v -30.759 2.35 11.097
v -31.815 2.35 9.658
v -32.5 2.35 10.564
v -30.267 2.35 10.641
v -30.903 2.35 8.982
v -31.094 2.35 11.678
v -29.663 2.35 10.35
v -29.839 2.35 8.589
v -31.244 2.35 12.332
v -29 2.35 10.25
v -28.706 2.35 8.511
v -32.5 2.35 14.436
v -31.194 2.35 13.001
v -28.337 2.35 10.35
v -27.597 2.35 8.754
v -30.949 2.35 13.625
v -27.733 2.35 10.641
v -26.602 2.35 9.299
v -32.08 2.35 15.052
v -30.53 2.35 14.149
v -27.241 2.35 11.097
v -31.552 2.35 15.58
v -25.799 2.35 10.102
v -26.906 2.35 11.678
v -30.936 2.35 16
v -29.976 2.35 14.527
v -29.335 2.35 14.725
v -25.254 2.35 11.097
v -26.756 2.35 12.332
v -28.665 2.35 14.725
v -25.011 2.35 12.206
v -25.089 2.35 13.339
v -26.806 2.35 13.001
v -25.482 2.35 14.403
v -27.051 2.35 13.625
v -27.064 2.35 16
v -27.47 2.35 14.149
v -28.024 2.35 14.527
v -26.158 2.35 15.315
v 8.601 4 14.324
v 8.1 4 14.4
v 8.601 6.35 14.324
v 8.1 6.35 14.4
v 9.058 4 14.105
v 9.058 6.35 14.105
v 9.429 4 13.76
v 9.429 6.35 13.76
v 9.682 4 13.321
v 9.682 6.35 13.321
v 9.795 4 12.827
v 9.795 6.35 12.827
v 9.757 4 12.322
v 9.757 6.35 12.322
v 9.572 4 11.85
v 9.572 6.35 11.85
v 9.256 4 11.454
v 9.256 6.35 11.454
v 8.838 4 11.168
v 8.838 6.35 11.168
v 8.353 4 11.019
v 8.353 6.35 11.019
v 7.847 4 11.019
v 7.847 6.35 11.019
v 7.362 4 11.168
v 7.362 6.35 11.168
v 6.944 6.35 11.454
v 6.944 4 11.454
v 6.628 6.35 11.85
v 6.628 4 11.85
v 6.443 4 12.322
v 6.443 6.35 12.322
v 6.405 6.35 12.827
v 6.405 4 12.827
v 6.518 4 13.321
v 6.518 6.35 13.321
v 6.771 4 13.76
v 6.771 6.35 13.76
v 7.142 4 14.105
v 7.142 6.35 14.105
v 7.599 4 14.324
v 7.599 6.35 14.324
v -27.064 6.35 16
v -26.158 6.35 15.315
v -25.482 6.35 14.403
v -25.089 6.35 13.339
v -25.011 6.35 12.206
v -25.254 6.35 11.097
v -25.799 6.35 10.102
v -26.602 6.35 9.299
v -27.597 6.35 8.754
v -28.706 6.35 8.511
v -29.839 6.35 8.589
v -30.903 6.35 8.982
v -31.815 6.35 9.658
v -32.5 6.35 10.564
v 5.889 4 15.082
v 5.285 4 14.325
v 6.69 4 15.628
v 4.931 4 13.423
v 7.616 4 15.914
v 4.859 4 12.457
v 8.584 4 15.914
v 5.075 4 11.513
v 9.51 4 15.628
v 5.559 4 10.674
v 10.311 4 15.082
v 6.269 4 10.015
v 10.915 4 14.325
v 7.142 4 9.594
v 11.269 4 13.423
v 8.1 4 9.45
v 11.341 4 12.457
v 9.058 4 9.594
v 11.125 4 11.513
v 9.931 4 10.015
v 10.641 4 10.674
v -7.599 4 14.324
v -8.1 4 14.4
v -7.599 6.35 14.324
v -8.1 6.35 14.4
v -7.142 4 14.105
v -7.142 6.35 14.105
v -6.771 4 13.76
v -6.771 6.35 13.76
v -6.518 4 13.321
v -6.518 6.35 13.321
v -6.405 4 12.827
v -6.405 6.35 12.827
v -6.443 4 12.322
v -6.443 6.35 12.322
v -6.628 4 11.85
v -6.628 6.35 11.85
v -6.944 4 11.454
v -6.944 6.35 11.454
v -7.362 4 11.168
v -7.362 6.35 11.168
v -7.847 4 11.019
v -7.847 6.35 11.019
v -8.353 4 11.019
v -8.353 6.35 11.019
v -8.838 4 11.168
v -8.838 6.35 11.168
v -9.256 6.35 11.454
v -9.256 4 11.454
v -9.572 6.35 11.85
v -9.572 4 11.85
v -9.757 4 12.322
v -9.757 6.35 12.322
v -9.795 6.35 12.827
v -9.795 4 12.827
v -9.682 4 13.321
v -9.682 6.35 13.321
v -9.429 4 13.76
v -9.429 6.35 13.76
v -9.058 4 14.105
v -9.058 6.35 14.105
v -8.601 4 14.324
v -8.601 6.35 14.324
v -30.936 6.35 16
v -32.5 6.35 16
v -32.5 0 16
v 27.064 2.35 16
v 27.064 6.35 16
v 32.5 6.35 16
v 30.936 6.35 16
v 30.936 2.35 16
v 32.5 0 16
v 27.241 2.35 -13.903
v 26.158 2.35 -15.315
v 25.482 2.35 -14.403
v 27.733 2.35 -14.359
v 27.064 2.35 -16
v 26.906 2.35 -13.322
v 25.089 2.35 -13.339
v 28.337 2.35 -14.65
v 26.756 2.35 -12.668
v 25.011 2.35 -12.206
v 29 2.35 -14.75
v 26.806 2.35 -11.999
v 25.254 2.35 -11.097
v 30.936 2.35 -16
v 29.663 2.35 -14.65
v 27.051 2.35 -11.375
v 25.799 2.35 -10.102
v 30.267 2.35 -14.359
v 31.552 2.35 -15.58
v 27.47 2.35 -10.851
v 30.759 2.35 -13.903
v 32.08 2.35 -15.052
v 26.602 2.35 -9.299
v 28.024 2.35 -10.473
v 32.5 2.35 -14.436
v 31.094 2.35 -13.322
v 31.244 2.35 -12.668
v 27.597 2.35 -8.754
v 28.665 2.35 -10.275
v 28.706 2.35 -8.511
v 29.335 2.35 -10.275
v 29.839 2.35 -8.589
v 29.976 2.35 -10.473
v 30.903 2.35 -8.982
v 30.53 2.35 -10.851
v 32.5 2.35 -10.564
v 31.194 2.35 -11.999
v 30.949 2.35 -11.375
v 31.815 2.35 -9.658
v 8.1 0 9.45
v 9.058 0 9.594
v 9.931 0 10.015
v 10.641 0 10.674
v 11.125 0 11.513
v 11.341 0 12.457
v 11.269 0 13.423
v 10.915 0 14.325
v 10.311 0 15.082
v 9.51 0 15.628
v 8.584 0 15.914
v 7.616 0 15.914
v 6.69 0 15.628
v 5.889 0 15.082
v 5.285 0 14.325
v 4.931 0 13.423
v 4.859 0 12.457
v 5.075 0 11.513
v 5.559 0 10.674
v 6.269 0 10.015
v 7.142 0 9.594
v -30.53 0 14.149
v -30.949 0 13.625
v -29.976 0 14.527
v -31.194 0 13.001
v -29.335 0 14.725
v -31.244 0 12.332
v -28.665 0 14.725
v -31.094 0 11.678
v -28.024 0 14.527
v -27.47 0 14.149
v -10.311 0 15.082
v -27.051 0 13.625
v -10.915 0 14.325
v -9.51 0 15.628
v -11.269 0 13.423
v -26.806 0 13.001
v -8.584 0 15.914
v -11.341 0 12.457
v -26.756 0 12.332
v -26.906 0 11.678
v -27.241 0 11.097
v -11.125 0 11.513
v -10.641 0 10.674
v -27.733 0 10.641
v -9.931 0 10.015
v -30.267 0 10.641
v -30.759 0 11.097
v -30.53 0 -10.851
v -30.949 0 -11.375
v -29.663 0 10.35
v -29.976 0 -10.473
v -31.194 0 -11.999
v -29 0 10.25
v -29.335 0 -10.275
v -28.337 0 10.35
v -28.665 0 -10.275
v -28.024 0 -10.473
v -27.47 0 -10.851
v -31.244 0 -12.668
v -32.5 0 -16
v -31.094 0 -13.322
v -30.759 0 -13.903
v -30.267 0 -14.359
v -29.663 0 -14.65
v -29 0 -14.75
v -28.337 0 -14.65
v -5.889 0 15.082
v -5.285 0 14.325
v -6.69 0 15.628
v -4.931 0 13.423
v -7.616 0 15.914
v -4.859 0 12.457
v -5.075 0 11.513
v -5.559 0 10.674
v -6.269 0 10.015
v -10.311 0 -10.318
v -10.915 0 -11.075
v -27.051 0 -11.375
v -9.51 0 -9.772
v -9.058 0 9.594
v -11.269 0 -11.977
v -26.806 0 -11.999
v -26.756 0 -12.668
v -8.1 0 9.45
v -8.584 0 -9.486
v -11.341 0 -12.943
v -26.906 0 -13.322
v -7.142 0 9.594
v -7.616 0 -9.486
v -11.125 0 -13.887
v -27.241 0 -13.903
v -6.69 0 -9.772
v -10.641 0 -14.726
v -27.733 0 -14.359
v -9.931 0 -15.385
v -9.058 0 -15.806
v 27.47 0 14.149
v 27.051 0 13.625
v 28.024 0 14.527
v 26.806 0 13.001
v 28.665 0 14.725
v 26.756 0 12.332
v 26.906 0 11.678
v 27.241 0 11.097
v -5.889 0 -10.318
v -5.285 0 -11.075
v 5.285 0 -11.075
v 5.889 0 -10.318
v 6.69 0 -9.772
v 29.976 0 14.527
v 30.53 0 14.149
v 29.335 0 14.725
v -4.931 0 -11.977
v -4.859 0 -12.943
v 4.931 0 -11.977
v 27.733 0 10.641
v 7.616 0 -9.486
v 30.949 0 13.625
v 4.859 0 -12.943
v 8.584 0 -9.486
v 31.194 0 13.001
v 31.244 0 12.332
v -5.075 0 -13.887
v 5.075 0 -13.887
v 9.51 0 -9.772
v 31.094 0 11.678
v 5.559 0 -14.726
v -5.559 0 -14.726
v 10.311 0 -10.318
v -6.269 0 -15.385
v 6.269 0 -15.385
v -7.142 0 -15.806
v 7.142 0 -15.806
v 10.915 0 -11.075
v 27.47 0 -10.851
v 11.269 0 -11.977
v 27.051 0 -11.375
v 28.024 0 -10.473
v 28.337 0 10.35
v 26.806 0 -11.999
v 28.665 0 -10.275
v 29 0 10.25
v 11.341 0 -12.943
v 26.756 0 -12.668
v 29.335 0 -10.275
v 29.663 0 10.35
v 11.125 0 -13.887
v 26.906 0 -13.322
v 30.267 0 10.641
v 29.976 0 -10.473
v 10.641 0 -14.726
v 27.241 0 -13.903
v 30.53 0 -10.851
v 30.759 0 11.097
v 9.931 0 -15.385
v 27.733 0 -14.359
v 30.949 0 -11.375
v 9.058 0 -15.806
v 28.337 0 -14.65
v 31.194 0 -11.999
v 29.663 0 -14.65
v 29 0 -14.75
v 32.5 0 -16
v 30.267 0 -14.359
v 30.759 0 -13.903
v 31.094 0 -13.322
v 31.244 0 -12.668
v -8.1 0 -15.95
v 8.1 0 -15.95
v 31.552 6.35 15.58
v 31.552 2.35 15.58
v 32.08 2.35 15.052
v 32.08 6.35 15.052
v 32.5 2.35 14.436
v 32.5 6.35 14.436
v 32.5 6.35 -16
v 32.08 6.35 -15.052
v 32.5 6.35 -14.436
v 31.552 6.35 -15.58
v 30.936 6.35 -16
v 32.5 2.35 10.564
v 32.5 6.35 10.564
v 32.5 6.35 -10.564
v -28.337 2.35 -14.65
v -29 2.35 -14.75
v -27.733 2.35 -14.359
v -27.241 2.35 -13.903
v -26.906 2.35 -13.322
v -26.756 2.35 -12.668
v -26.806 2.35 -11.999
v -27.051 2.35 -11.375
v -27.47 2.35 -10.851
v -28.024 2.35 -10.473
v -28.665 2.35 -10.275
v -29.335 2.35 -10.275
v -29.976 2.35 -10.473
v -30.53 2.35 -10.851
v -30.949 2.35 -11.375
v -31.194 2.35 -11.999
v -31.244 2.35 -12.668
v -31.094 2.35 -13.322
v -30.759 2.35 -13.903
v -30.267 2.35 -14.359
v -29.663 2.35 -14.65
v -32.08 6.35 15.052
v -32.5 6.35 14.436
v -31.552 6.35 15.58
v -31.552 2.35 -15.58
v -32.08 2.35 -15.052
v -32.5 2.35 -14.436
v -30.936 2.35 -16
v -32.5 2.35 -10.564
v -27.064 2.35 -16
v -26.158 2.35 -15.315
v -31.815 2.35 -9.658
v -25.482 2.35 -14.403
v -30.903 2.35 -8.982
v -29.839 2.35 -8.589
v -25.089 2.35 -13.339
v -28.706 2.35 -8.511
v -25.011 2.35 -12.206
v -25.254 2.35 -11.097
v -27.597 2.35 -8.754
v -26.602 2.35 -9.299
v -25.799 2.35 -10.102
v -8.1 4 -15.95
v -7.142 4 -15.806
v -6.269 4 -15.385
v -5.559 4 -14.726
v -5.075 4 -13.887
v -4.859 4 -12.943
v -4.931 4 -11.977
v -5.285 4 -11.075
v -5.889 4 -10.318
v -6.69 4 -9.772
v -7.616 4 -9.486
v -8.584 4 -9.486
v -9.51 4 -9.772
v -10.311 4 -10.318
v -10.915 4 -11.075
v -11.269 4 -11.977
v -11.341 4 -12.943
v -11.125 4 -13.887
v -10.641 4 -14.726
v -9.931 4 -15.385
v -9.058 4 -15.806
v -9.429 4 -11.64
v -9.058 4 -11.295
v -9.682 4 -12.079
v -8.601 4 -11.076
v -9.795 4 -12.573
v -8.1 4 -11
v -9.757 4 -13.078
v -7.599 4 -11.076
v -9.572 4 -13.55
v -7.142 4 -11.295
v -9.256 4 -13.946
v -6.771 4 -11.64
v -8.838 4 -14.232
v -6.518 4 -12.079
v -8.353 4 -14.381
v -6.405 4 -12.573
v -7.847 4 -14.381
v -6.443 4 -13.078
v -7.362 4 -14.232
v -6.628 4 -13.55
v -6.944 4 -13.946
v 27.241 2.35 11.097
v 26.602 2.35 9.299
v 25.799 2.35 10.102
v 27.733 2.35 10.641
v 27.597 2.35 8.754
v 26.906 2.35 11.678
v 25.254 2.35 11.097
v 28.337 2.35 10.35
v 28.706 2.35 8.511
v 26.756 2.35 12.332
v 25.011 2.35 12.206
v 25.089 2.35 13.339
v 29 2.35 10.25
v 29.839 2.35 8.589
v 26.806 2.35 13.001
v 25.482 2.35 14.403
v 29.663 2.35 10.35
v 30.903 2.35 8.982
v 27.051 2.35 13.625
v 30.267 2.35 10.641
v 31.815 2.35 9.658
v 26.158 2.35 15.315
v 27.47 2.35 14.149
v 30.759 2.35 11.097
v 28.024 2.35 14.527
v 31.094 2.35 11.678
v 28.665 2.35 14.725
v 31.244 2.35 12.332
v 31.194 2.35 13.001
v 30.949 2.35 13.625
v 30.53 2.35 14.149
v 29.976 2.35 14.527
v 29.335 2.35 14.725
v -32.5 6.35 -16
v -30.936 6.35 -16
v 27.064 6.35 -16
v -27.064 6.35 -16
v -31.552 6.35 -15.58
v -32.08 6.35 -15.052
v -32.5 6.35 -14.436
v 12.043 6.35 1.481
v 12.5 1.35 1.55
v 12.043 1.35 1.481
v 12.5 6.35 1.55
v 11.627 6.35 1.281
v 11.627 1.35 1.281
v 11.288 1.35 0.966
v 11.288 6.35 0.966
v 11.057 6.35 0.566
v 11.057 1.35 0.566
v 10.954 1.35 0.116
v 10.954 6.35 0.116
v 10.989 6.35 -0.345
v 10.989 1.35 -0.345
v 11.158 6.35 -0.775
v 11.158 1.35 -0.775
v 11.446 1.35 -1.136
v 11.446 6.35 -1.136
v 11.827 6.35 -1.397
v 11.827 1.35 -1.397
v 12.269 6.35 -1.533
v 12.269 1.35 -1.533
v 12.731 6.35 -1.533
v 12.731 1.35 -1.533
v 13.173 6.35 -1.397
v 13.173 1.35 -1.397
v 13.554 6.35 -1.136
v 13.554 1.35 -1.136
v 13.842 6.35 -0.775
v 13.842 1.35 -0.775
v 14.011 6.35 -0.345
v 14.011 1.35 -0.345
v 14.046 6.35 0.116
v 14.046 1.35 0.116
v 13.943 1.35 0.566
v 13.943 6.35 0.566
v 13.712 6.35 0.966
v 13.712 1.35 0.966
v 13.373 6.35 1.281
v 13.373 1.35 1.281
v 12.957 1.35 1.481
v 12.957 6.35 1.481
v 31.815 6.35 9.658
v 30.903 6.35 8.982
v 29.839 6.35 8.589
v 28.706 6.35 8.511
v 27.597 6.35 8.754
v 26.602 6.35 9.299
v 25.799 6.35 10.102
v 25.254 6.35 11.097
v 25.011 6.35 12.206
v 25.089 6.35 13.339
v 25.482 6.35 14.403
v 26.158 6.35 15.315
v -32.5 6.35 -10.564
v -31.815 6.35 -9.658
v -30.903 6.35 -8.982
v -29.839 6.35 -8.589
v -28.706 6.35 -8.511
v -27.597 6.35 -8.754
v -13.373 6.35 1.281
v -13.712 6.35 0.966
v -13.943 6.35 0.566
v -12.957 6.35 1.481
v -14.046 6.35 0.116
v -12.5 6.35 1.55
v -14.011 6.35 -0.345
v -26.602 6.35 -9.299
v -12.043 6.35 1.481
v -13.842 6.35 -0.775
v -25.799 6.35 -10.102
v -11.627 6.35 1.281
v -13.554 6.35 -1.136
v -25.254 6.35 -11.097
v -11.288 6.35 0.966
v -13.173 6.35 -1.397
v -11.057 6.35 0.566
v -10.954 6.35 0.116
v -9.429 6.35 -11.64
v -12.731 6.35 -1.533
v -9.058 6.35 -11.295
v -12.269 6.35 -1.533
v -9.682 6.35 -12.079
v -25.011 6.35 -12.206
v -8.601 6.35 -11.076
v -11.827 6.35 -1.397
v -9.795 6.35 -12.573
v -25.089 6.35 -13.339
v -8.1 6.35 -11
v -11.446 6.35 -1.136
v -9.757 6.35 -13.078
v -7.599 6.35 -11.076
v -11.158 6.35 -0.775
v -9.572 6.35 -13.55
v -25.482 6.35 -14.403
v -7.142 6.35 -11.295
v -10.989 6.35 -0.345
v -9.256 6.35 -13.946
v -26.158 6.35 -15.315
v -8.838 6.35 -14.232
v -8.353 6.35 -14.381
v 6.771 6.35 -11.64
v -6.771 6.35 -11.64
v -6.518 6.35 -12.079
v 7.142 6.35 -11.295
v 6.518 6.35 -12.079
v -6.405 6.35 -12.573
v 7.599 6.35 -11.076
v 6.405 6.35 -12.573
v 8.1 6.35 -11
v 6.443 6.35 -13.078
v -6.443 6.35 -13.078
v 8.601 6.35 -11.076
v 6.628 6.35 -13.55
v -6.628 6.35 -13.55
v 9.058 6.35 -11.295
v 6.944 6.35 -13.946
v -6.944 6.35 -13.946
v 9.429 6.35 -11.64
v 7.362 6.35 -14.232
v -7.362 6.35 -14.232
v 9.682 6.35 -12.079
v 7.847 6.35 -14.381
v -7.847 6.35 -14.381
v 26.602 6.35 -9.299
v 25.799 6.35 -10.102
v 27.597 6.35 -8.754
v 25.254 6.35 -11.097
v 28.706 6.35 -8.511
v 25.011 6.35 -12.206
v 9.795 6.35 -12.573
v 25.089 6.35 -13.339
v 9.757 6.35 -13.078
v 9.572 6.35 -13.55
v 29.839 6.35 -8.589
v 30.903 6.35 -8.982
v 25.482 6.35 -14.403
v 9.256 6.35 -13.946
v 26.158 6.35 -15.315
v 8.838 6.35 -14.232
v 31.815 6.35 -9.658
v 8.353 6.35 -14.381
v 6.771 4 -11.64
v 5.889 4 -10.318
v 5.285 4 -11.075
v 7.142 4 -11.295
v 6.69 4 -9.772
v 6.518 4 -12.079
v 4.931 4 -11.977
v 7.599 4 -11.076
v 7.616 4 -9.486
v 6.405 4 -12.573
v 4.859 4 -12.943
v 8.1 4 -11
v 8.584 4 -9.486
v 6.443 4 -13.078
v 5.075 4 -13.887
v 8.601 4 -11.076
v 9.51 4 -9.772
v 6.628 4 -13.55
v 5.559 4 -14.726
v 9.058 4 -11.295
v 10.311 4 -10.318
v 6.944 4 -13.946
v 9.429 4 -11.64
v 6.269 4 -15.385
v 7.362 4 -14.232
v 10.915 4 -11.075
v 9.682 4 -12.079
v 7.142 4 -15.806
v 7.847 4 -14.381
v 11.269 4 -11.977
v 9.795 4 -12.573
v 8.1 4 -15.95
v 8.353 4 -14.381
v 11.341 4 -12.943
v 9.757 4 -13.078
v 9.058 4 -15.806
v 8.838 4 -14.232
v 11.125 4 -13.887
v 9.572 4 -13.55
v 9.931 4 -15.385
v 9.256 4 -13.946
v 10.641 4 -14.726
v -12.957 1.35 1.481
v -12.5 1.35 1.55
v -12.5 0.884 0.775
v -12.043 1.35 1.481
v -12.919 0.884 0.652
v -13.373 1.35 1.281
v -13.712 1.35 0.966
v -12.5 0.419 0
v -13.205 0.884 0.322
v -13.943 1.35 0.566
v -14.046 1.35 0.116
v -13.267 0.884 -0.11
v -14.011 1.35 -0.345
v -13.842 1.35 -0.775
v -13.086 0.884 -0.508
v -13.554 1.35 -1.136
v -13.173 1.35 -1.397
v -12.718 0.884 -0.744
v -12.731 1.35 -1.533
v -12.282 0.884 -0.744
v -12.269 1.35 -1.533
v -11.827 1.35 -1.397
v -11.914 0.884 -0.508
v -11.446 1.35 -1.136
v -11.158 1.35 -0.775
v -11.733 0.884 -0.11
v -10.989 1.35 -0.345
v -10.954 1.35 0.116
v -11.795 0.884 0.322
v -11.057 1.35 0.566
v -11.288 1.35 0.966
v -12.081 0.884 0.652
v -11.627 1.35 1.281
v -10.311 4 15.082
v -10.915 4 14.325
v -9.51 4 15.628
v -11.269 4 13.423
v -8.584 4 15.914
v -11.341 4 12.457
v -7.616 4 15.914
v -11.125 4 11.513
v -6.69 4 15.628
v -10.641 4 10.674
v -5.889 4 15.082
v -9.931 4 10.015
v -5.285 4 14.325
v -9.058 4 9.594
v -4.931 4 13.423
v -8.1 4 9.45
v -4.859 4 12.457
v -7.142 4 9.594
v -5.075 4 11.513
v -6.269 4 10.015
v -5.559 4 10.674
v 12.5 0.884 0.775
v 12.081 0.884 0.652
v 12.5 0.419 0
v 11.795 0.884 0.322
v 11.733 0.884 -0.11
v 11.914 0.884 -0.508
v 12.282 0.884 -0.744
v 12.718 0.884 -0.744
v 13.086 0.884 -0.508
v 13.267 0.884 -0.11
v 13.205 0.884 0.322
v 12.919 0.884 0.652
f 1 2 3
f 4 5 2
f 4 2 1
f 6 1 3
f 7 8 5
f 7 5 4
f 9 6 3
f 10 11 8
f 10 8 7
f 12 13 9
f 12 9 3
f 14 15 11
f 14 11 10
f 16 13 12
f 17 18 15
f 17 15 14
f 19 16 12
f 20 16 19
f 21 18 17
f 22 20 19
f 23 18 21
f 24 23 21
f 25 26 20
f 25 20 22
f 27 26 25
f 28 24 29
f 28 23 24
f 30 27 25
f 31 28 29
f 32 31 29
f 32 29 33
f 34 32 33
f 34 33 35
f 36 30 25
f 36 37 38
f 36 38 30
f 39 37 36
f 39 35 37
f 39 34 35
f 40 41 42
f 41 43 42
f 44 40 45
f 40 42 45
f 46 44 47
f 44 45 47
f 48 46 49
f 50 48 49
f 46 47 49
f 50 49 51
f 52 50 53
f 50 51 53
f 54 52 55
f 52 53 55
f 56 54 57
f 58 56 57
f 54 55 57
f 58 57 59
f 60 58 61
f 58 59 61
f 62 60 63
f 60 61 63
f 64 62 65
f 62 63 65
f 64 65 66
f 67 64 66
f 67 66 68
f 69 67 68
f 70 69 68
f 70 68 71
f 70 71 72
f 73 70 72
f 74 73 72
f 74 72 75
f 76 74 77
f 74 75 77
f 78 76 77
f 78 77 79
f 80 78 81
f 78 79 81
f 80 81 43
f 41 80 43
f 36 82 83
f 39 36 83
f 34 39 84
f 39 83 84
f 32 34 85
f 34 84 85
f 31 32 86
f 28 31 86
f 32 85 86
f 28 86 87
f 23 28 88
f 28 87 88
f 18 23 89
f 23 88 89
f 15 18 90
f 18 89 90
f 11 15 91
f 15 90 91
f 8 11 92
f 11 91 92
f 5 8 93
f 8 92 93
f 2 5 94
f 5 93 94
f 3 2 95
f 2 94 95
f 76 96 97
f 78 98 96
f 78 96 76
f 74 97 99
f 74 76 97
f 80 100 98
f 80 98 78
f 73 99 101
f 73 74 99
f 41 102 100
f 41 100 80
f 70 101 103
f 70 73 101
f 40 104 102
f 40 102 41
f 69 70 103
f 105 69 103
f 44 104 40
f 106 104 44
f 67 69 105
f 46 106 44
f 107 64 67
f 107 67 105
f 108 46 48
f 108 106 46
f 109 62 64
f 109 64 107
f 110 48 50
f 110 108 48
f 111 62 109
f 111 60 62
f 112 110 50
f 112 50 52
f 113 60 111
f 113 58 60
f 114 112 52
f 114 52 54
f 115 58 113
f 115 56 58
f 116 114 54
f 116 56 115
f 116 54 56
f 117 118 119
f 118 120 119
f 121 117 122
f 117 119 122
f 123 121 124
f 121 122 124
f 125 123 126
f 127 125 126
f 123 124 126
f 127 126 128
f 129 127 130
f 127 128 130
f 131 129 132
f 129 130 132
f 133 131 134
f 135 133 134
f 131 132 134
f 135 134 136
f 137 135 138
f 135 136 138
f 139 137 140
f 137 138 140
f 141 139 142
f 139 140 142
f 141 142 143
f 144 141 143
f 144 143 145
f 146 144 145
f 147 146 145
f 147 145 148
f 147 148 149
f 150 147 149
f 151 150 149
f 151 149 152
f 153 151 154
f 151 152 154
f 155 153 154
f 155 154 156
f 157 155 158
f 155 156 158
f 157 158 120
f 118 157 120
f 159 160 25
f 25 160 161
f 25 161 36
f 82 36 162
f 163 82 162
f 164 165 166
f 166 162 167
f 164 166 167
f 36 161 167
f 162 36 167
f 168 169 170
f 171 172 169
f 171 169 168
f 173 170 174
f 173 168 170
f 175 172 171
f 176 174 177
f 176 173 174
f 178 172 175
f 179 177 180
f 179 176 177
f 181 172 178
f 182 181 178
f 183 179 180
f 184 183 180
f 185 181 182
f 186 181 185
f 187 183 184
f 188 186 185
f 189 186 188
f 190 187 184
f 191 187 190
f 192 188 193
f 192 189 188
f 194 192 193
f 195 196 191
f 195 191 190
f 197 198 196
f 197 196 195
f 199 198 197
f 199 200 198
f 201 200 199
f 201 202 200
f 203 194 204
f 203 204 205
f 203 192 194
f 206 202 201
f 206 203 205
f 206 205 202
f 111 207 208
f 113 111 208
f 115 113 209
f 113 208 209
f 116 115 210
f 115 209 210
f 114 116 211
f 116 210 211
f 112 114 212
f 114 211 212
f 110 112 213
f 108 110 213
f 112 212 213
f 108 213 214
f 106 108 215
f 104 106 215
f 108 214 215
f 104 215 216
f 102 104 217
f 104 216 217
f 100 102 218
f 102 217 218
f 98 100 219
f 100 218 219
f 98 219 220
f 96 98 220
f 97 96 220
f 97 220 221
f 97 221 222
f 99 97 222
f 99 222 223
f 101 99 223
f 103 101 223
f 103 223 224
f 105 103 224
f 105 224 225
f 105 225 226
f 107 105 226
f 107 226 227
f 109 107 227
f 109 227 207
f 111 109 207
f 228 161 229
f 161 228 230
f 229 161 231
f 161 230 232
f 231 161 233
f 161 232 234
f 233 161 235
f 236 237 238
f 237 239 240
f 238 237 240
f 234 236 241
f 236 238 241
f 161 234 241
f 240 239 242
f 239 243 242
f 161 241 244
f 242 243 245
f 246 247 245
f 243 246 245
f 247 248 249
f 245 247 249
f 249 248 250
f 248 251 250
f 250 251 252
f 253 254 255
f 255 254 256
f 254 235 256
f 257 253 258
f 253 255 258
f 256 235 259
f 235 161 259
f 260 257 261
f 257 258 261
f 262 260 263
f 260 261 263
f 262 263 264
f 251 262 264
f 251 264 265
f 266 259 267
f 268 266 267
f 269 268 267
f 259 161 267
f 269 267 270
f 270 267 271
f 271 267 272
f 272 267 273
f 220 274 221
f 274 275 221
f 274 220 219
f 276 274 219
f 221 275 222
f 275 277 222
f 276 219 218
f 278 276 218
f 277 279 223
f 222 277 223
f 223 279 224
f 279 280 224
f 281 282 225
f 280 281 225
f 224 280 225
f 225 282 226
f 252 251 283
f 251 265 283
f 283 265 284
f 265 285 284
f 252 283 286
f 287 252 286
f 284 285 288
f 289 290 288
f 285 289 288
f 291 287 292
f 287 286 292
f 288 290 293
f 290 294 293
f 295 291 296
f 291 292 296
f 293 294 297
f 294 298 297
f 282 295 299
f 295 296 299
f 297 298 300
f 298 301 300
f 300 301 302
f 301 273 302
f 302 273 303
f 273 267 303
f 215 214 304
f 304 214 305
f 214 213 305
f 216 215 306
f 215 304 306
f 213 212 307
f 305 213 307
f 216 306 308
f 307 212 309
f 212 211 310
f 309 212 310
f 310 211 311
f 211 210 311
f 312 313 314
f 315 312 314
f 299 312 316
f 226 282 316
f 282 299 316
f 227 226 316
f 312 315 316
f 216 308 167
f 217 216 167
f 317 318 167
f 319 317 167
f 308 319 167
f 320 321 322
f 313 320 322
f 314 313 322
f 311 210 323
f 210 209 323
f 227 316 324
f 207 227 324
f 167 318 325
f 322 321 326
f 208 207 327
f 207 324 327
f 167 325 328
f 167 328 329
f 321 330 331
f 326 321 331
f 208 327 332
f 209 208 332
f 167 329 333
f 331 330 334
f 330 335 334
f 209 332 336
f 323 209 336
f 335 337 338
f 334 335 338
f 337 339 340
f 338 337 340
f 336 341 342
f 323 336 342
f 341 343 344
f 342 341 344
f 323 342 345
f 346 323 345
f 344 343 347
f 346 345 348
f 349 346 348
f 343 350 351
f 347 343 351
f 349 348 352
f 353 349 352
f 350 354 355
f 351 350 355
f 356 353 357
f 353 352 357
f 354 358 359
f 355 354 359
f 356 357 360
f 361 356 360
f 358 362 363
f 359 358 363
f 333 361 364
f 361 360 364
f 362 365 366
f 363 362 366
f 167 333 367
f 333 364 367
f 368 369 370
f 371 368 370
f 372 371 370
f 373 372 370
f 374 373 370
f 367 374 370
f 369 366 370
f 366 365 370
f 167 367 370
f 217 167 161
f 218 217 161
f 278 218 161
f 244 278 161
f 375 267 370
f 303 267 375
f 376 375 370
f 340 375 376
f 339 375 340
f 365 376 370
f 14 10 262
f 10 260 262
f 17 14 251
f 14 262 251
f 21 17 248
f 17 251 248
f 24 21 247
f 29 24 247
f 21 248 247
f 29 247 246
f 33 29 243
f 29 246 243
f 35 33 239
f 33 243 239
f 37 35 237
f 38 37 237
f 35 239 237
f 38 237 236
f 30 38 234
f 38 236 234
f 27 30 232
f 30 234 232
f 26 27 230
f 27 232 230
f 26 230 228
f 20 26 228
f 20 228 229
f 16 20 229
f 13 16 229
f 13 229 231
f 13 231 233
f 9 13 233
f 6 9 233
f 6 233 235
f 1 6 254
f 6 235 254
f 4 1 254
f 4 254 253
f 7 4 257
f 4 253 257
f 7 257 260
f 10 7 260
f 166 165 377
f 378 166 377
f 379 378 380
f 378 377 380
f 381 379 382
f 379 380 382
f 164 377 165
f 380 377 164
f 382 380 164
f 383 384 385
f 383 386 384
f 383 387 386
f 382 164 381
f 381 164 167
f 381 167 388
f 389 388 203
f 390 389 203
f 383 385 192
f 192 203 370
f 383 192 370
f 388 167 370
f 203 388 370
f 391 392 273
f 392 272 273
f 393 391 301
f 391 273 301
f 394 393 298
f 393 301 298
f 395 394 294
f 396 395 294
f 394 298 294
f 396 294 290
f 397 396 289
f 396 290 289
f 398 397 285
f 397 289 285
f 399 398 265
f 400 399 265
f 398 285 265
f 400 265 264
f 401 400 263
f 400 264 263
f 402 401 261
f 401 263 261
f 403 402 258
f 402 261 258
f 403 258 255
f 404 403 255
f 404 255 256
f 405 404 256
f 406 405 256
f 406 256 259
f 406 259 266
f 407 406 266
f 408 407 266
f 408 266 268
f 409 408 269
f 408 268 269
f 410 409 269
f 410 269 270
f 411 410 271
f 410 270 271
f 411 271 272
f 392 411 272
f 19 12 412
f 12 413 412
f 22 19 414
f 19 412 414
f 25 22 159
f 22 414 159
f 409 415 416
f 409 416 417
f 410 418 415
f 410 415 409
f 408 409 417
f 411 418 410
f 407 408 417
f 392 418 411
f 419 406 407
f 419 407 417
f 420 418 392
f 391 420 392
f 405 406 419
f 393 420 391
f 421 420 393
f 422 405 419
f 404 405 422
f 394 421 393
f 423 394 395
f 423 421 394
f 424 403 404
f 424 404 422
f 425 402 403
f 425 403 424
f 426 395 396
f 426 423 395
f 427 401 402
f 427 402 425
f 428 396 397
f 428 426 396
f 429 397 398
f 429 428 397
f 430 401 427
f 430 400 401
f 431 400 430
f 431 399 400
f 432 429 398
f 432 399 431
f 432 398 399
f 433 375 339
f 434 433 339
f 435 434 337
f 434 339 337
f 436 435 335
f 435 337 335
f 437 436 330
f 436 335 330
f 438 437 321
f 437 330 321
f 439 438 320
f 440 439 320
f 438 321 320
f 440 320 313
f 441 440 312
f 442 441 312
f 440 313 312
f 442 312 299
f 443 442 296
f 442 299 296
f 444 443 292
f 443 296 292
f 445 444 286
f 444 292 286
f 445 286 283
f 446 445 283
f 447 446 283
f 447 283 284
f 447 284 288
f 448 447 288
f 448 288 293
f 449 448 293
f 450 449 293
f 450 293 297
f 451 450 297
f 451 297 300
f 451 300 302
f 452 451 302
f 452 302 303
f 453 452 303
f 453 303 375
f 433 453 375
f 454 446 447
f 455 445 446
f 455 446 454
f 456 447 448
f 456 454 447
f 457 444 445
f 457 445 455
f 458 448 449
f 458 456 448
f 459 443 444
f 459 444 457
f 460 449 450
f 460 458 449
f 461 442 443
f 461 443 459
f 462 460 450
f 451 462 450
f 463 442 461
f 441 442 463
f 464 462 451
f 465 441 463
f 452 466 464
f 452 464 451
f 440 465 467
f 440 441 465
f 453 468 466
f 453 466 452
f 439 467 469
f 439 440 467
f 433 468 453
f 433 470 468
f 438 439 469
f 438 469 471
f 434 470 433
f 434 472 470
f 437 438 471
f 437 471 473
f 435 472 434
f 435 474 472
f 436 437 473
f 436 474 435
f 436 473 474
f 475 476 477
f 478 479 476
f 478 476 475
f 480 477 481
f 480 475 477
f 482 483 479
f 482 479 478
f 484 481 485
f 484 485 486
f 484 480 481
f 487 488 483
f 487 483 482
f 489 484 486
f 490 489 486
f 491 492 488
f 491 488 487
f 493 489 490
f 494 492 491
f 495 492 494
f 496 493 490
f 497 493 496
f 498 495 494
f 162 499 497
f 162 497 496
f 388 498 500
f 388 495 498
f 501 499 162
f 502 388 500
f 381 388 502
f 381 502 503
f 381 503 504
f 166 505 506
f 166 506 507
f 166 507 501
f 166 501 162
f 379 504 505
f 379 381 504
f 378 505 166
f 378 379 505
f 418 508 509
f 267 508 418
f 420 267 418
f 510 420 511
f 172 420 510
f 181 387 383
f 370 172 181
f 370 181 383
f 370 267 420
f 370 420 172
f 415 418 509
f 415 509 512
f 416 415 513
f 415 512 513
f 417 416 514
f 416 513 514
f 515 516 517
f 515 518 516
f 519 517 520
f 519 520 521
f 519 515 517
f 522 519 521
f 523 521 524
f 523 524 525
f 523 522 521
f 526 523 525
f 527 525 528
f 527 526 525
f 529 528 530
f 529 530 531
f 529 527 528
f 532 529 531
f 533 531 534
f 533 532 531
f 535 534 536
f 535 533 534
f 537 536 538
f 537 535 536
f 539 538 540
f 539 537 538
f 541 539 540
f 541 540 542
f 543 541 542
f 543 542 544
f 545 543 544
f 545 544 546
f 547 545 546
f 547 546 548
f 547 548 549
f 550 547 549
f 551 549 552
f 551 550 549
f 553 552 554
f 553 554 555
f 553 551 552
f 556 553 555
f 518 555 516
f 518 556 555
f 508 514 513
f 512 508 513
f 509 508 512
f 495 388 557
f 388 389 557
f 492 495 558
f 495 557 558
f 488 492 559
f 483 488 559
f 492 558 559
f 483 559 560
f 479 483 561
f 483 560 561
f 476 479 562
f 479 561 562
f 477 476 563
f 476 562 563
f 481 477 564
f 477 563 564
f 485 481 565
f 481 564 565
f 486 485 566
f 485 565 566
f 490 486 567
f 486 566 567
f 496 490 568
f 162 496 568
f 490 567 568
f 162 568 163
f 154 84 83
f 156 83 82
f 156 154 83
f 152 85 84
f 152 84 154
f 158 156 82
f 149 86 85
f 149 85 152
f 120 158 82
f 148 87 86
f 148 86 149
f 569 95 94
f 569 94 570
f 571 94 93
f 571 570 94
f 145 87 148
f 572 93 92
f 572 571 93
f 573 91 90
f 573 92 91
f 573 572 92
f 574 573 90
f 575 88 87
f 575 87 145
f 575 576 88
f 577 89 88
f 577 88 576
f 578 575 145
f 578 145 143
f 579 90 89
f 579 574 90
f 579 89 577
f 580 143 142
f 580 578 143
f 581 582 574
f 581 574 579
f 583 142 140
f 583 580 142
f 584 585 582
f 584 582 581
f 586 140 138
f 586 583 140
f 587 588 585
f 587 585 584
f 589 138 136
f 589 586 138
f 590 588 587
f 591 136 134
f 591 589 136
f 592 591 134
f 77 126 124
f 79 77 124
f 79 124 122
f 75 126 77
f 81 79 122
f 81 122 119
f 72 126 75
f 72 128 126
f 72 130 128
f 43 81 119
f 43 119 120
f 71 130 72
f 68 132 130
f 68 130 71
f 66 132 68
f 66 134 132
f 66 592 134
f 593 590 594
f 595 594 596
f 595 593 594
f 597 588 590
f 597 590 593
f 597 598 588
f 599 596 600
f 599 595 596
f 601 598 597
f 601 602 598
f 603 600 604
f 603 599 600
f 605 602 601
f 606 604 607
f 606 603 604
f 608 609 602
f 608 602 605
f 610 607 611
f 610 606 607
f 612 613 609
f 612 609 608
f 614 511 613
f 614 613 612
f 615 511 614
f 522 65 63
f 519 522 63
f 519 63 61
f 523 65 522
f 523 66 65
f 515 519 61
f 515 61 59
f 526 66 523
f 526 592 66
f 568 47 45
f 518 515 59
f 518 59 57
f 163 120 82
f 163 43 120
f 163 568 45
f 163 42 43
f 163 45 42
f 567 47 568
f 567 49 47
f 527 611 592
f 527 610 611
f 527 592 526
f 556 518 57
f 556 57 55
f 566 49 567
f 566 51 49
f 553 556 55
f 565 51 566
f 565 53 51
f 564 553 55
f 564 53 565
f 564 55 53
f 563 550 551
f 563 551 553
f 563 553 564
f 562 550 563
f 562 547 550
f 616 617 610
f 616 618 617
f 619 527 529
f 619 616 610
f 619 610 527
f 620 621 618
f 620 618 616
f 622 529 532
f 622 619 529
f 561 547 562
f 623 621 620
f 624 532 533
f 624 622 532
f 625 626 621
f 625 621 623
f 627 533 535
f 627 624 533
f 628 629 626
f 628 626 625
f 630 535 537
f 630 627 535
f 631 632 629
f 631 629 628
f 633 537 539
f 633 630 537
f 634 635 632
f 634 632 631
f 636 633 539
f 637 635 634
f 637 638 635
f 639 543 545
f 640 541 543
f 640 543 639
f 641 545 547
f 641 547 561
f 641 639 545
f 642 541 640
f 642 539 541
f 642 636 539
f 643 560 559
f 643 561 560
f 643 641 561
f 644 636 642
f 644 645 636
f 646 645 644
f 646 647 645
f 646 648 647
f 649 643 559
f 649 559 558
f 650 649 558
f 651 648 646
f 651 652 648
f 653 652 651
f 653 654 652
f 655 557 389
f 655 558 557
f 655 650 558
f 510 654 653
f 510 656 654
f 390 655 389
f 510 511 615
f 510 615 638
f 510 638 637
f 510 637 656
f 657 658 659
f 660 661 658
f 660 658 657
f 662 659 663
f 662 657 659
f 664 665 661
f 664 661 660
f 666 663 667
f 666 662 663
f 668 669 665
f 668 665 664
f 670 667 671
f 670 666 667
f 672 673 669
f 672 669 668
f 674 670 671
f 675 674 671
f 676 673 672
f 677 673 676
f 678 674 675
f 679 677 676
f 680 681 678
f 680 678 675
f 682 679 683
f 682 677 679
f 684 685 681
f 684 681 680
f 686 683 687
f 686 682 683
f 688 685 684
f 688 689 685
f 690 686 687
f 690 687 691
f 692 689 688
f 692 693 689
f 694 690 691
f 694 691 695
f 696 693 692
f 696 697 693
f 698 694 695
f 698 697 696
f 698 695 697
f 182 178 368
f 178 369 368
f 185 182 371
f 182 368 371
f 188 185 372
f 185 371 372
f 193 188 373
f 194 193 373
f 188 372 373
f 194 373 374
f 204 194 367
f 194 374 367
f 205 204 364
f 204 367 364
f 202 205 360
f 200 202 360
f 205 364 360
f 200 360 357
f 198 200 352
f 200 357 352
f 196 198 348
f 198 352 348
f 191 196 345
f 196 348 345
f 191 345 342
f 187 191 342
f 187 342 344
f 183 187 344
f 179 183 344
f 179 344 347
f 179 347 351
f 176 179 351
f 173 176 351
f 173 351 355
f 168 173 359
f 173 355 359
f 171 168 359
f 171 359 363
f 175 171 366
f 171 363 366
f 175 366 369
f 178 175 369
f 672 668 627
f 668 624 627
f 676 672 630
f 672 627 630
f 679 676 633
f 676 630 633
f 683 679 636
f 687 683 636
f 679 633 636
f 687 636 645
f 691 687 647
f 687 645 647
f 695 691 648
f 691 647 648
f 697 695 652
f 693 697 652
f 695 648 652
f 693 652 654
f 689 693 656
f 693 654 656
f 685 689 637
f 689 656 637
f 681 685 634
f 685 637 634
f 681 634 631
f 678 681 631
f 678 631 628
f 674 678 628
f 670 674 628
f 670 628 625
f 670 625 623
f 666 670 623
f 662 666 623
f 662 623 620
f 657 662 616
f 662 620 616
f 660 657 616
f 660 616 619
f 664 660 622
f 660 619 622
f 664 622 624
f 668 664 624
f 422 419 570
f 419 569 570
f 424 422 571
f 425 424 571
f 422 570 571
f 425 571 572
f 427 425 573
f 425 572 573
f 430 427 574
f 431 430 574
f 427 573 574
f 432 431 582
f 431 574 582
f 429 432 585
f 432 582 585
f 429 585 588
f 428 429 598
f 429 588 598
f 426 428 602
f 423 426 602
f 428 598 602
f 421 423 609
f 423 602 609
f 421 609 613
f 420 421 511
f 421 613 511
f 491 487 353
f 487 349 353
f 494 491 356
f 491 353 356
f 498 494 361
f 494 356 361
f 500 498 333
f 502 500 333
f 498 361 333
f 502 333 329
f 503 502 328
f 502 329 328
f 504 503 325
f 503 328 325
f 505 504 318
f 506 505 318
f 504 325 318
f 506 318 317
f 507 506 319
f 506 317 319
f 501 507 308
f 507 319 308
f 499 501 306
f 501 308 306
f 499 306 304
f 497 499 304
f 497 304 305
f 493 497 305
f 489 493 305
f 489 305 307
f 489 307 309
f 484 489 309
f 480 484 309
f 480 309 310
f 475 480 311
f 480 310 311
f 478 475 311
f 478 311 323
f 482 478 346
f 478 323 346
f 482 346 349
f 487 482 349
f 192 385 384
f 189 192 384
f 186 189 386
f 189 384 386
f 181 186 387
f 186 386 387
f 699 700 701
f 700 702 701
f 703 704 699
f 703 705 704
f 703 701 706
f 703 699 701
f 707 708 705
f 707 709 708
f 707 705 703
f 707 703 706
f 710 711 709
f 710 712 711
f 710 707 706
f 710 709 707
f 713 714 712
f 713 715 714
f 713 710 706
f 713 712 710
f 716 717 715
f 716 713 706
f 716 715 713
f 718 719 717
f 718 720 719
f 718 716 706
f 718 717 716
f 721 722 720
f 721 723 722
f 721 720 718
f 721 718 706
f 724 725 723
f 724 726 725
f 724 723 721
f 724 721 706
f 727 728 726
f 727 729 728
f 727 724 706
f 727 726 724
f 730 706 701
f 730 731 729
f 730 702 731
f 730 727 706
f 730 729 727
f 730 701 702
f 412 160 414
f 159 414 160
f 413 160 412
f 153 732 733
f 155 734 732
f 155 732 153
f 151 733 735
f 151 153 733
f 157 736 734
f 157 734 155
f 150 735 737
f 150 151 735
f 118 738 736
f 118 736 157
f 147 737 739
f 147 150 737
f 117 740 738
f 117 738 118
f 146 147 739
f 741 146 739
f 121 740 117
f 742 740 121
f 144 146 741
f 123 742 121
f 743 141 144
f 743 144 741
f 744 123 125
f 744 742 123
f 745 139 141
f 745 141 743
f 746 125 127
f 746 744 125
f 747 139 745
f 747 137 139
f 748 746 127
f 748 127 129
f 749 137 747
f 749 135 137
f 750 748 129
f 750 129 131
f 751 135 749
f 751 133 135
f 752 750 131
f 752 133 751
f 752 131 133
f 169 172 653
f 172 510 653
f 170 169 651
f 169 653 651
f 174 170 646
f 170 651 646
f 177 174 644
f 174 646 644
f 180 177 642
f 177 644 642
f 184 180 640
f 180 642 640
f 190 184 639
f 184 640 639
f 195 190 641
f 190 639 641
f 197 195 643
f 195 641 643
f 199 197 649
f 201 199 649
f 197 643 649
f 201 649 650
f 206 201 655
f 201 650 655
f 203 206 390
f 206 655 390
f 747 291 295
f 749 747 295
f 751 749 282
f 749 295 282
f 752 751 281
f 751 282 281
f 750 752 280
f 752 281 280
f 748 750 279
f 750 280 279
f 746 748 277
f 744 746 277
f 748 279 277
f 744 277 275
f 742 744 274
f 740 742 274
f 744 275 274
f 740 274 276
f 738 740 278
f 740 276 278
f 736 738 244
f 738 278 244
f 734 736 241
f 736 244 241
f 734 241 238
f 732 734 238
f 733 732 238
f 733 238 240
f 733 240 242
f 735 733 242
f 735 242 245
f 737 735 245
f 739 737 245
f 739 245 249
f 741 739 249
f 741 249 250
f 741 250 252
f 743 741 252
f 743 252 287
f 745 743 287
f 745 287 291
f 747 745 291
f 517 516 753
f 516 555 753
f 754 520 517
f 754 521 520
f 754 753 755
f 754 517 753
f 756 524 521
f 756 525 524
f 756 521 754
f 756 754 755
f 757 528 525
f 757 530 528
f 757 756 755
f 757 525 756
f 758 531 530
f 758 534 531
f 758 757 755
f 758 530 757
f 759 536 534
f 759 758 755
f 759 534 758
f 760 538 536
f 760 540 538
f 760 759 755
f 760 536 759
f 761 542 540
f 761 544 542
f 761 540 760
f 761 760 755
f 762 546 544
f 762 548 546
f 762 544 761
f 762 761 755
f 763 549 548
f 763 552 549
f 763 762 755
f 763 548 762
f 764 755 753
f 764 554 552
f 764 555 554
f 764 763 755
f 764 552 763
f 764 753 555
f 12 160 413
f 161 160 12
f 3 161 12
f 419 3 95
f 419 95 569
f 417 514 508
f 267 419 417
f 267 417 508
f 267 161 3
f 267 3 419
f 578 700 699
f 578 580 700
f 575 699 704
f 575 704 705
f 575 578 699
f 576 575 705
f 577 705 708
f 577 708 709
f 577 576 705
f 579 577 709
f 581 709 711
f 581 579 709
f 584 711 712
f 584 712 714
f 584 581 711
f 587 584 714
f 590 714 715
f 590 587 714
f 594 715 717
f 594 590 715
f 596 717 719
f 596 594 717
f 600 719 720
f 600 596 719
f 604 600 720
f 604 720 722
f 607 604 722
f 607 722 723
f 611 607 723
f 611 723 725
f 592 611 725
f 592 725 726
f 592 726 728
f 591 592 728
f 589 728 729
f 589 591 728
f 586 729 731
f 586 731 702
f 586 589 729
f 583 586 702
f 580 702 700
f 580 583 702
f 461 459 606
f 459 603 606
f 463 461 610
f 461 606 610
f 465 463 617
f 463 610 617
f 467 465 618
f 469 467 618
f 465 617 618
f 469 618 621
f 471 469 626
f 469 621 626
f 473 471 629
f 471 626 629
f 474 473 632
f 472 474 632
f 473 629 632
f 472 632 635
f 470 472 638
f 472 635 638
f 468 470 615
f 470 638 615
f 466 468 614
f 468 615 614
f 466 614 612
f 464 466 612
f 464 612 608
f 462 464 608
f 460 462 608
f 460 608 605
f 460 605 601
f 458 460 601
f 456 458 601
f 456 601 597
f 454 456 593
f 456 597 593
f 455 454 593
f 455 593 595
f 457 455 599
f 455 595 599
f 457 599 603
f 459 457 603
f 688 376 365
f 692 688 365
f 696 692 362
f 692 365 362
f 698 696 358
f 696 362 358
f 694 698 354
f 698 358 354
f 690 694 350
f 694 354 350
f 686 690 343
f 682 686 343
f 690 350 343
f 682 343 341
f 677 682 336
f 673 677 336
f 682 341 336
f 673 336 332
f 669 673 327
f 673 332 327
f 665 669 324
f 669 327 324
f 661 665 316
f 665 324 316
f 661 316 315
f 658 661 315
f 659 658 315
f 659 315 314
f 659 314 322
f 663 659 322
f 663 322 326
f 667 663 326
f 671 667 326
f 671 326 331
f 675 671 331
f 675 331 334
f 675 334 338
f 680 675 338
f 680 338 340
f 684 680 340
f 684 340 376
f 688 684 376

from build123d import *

# Parameters (mm, degrees)
SKETCH1_W                      = 65
SKETCH1_H                      = 32
EXTRUDE1_DEPTH                 = 6.35
CBORE_FOR_M4_SHCS1_D           = 4.5
CBORE_FOR_M4_SHCS1_CBORE_D     = 8
CBORE_FOR_M4_SHCS1_CBORE_DEPTH = 4
LPATTERN2_COUNT                = 2
LPATTERN2_PITCH                = 58
LPATTERN2_COUNT_DIR2           = 2
LPATTERN2_PITCH_DIR2           = 25
CBORE_FOR_M3_SHCS1_D           = 3.4
CBORE_FOR_M3_SHCS1_CBORE_D     = 6.5
CBORE_FOR_M3_SHCS1_CBORE_DEPTH = 4
LPATTERN3_COUNT                = 2
LPATTERN3_PITCH                = 16.2
LPATTERN3_COUNT_DIR2           = 2
LPATTERN3_PITCH_DIR2           = 25.4
LPATTERN4_COUNT                = 2
LPATTERN4_PITCH                = 25


with BuildPart() as part:
    # Sketch1 → Extrude1 (new body)
    with BuildSketch(Plane(origin=(0, 0, 0), x_dir=(1, 0, 0), z_dir=(0, 1, 0))):
        Rectangle(SKETCH1_W, SKETCH1_H)
    extrude(amount=EXTRUDE1_DEPTH)

    # CBORE for M4 SHCS1 (through all)
    with Locations(Plane(origin=(-29, 6.35, -12.5), x_dir=(0, 0, 1), z_dir=(0, 1, 0))):
        with Locations((0, 0)):
            cbore_for_m4_shcs1 = CounterBoreHole(CBORE_FOR_M4_SHCS1_D / 2, CBORE_FOR_M4_SHCS1_CBORE_D / 2, CBORE_FOR_M4_SHCS1_CBORE_DEPTH)

    # LPattern2: CBORE for M4 SHCS1 2 × 2
    with Locations(*[(i * LPATTERN2_PITCH, 0, j * LPATTERN2_PITCH_DIR2) for i in range(LPATTERN2_COUNT) for j in range(LPATTERN2_COUNT_DIR2) if (i, j) != (0, 0)]):
        add(cbore_for_m4_shcs1, mode=Mode.SUBTRACT)

    # CBORE for M3 SHCS1 (through all)
    with Locations(Plane(origin=(-8.1, 0, 12.7), x_dir=(0, 0, -1), z_dir=(0, -1, 0))):
        with Locations((0, 0)):
            cbore_for_m3_shcs1 = CounterBoreHole(CBORE_FOR_M3_SHCS1_D / 2, CBORE_FOR_M3_SHCS1_CBORE_D / 2, CBORE_FOR_M3_SHCS1_CBORE_DEPTH)

    # LPattern3: CBORE for M3 SHCS1 2 × 2
    with Locations(*[(i * LPATTERN3_PITCH, 0, -j * LPATTERN3_PITCH_DIR2) for i in range(LPATTERN3_COUNT) for j in range(LPATTERN3_COUNT_DIR2) if (i, j) != (0, 0)]):
        add(cbore_for_m3_shcs1, mode=Mode.SUBTRACT)

    # Sketch8 → Ø3.1 (3.1) Diameter Hole1 (revolve, cut)
    with BuildSketch(Plane(origin=(-12.5, 6.35, 0), x_dir=(0, 0, 1), z_dir=(1, 0, 0))):
        Polygon((0, 0), (0, 5.931333959), (1.55, 5), (1.55, 0), align=None)
    f_3_1_3_1_diameter_hole1 = revolve(axis=Axis((-12.5, 12.7, 0), (0, -1, 0)), mode=Mode.SUBTRACT)

    # LPattern4: Ø3.1 (3.1) Diameter Hole1 ×2
    with Locations(*[(i * LPATTERN4_PITCH, 0, 0) for i in range(1, LPATTERN4_COUNT)]):
        add(f_3_1_3_1_diameter_hole1, mode=Mode.SUBTRACT)


solid = part.part
